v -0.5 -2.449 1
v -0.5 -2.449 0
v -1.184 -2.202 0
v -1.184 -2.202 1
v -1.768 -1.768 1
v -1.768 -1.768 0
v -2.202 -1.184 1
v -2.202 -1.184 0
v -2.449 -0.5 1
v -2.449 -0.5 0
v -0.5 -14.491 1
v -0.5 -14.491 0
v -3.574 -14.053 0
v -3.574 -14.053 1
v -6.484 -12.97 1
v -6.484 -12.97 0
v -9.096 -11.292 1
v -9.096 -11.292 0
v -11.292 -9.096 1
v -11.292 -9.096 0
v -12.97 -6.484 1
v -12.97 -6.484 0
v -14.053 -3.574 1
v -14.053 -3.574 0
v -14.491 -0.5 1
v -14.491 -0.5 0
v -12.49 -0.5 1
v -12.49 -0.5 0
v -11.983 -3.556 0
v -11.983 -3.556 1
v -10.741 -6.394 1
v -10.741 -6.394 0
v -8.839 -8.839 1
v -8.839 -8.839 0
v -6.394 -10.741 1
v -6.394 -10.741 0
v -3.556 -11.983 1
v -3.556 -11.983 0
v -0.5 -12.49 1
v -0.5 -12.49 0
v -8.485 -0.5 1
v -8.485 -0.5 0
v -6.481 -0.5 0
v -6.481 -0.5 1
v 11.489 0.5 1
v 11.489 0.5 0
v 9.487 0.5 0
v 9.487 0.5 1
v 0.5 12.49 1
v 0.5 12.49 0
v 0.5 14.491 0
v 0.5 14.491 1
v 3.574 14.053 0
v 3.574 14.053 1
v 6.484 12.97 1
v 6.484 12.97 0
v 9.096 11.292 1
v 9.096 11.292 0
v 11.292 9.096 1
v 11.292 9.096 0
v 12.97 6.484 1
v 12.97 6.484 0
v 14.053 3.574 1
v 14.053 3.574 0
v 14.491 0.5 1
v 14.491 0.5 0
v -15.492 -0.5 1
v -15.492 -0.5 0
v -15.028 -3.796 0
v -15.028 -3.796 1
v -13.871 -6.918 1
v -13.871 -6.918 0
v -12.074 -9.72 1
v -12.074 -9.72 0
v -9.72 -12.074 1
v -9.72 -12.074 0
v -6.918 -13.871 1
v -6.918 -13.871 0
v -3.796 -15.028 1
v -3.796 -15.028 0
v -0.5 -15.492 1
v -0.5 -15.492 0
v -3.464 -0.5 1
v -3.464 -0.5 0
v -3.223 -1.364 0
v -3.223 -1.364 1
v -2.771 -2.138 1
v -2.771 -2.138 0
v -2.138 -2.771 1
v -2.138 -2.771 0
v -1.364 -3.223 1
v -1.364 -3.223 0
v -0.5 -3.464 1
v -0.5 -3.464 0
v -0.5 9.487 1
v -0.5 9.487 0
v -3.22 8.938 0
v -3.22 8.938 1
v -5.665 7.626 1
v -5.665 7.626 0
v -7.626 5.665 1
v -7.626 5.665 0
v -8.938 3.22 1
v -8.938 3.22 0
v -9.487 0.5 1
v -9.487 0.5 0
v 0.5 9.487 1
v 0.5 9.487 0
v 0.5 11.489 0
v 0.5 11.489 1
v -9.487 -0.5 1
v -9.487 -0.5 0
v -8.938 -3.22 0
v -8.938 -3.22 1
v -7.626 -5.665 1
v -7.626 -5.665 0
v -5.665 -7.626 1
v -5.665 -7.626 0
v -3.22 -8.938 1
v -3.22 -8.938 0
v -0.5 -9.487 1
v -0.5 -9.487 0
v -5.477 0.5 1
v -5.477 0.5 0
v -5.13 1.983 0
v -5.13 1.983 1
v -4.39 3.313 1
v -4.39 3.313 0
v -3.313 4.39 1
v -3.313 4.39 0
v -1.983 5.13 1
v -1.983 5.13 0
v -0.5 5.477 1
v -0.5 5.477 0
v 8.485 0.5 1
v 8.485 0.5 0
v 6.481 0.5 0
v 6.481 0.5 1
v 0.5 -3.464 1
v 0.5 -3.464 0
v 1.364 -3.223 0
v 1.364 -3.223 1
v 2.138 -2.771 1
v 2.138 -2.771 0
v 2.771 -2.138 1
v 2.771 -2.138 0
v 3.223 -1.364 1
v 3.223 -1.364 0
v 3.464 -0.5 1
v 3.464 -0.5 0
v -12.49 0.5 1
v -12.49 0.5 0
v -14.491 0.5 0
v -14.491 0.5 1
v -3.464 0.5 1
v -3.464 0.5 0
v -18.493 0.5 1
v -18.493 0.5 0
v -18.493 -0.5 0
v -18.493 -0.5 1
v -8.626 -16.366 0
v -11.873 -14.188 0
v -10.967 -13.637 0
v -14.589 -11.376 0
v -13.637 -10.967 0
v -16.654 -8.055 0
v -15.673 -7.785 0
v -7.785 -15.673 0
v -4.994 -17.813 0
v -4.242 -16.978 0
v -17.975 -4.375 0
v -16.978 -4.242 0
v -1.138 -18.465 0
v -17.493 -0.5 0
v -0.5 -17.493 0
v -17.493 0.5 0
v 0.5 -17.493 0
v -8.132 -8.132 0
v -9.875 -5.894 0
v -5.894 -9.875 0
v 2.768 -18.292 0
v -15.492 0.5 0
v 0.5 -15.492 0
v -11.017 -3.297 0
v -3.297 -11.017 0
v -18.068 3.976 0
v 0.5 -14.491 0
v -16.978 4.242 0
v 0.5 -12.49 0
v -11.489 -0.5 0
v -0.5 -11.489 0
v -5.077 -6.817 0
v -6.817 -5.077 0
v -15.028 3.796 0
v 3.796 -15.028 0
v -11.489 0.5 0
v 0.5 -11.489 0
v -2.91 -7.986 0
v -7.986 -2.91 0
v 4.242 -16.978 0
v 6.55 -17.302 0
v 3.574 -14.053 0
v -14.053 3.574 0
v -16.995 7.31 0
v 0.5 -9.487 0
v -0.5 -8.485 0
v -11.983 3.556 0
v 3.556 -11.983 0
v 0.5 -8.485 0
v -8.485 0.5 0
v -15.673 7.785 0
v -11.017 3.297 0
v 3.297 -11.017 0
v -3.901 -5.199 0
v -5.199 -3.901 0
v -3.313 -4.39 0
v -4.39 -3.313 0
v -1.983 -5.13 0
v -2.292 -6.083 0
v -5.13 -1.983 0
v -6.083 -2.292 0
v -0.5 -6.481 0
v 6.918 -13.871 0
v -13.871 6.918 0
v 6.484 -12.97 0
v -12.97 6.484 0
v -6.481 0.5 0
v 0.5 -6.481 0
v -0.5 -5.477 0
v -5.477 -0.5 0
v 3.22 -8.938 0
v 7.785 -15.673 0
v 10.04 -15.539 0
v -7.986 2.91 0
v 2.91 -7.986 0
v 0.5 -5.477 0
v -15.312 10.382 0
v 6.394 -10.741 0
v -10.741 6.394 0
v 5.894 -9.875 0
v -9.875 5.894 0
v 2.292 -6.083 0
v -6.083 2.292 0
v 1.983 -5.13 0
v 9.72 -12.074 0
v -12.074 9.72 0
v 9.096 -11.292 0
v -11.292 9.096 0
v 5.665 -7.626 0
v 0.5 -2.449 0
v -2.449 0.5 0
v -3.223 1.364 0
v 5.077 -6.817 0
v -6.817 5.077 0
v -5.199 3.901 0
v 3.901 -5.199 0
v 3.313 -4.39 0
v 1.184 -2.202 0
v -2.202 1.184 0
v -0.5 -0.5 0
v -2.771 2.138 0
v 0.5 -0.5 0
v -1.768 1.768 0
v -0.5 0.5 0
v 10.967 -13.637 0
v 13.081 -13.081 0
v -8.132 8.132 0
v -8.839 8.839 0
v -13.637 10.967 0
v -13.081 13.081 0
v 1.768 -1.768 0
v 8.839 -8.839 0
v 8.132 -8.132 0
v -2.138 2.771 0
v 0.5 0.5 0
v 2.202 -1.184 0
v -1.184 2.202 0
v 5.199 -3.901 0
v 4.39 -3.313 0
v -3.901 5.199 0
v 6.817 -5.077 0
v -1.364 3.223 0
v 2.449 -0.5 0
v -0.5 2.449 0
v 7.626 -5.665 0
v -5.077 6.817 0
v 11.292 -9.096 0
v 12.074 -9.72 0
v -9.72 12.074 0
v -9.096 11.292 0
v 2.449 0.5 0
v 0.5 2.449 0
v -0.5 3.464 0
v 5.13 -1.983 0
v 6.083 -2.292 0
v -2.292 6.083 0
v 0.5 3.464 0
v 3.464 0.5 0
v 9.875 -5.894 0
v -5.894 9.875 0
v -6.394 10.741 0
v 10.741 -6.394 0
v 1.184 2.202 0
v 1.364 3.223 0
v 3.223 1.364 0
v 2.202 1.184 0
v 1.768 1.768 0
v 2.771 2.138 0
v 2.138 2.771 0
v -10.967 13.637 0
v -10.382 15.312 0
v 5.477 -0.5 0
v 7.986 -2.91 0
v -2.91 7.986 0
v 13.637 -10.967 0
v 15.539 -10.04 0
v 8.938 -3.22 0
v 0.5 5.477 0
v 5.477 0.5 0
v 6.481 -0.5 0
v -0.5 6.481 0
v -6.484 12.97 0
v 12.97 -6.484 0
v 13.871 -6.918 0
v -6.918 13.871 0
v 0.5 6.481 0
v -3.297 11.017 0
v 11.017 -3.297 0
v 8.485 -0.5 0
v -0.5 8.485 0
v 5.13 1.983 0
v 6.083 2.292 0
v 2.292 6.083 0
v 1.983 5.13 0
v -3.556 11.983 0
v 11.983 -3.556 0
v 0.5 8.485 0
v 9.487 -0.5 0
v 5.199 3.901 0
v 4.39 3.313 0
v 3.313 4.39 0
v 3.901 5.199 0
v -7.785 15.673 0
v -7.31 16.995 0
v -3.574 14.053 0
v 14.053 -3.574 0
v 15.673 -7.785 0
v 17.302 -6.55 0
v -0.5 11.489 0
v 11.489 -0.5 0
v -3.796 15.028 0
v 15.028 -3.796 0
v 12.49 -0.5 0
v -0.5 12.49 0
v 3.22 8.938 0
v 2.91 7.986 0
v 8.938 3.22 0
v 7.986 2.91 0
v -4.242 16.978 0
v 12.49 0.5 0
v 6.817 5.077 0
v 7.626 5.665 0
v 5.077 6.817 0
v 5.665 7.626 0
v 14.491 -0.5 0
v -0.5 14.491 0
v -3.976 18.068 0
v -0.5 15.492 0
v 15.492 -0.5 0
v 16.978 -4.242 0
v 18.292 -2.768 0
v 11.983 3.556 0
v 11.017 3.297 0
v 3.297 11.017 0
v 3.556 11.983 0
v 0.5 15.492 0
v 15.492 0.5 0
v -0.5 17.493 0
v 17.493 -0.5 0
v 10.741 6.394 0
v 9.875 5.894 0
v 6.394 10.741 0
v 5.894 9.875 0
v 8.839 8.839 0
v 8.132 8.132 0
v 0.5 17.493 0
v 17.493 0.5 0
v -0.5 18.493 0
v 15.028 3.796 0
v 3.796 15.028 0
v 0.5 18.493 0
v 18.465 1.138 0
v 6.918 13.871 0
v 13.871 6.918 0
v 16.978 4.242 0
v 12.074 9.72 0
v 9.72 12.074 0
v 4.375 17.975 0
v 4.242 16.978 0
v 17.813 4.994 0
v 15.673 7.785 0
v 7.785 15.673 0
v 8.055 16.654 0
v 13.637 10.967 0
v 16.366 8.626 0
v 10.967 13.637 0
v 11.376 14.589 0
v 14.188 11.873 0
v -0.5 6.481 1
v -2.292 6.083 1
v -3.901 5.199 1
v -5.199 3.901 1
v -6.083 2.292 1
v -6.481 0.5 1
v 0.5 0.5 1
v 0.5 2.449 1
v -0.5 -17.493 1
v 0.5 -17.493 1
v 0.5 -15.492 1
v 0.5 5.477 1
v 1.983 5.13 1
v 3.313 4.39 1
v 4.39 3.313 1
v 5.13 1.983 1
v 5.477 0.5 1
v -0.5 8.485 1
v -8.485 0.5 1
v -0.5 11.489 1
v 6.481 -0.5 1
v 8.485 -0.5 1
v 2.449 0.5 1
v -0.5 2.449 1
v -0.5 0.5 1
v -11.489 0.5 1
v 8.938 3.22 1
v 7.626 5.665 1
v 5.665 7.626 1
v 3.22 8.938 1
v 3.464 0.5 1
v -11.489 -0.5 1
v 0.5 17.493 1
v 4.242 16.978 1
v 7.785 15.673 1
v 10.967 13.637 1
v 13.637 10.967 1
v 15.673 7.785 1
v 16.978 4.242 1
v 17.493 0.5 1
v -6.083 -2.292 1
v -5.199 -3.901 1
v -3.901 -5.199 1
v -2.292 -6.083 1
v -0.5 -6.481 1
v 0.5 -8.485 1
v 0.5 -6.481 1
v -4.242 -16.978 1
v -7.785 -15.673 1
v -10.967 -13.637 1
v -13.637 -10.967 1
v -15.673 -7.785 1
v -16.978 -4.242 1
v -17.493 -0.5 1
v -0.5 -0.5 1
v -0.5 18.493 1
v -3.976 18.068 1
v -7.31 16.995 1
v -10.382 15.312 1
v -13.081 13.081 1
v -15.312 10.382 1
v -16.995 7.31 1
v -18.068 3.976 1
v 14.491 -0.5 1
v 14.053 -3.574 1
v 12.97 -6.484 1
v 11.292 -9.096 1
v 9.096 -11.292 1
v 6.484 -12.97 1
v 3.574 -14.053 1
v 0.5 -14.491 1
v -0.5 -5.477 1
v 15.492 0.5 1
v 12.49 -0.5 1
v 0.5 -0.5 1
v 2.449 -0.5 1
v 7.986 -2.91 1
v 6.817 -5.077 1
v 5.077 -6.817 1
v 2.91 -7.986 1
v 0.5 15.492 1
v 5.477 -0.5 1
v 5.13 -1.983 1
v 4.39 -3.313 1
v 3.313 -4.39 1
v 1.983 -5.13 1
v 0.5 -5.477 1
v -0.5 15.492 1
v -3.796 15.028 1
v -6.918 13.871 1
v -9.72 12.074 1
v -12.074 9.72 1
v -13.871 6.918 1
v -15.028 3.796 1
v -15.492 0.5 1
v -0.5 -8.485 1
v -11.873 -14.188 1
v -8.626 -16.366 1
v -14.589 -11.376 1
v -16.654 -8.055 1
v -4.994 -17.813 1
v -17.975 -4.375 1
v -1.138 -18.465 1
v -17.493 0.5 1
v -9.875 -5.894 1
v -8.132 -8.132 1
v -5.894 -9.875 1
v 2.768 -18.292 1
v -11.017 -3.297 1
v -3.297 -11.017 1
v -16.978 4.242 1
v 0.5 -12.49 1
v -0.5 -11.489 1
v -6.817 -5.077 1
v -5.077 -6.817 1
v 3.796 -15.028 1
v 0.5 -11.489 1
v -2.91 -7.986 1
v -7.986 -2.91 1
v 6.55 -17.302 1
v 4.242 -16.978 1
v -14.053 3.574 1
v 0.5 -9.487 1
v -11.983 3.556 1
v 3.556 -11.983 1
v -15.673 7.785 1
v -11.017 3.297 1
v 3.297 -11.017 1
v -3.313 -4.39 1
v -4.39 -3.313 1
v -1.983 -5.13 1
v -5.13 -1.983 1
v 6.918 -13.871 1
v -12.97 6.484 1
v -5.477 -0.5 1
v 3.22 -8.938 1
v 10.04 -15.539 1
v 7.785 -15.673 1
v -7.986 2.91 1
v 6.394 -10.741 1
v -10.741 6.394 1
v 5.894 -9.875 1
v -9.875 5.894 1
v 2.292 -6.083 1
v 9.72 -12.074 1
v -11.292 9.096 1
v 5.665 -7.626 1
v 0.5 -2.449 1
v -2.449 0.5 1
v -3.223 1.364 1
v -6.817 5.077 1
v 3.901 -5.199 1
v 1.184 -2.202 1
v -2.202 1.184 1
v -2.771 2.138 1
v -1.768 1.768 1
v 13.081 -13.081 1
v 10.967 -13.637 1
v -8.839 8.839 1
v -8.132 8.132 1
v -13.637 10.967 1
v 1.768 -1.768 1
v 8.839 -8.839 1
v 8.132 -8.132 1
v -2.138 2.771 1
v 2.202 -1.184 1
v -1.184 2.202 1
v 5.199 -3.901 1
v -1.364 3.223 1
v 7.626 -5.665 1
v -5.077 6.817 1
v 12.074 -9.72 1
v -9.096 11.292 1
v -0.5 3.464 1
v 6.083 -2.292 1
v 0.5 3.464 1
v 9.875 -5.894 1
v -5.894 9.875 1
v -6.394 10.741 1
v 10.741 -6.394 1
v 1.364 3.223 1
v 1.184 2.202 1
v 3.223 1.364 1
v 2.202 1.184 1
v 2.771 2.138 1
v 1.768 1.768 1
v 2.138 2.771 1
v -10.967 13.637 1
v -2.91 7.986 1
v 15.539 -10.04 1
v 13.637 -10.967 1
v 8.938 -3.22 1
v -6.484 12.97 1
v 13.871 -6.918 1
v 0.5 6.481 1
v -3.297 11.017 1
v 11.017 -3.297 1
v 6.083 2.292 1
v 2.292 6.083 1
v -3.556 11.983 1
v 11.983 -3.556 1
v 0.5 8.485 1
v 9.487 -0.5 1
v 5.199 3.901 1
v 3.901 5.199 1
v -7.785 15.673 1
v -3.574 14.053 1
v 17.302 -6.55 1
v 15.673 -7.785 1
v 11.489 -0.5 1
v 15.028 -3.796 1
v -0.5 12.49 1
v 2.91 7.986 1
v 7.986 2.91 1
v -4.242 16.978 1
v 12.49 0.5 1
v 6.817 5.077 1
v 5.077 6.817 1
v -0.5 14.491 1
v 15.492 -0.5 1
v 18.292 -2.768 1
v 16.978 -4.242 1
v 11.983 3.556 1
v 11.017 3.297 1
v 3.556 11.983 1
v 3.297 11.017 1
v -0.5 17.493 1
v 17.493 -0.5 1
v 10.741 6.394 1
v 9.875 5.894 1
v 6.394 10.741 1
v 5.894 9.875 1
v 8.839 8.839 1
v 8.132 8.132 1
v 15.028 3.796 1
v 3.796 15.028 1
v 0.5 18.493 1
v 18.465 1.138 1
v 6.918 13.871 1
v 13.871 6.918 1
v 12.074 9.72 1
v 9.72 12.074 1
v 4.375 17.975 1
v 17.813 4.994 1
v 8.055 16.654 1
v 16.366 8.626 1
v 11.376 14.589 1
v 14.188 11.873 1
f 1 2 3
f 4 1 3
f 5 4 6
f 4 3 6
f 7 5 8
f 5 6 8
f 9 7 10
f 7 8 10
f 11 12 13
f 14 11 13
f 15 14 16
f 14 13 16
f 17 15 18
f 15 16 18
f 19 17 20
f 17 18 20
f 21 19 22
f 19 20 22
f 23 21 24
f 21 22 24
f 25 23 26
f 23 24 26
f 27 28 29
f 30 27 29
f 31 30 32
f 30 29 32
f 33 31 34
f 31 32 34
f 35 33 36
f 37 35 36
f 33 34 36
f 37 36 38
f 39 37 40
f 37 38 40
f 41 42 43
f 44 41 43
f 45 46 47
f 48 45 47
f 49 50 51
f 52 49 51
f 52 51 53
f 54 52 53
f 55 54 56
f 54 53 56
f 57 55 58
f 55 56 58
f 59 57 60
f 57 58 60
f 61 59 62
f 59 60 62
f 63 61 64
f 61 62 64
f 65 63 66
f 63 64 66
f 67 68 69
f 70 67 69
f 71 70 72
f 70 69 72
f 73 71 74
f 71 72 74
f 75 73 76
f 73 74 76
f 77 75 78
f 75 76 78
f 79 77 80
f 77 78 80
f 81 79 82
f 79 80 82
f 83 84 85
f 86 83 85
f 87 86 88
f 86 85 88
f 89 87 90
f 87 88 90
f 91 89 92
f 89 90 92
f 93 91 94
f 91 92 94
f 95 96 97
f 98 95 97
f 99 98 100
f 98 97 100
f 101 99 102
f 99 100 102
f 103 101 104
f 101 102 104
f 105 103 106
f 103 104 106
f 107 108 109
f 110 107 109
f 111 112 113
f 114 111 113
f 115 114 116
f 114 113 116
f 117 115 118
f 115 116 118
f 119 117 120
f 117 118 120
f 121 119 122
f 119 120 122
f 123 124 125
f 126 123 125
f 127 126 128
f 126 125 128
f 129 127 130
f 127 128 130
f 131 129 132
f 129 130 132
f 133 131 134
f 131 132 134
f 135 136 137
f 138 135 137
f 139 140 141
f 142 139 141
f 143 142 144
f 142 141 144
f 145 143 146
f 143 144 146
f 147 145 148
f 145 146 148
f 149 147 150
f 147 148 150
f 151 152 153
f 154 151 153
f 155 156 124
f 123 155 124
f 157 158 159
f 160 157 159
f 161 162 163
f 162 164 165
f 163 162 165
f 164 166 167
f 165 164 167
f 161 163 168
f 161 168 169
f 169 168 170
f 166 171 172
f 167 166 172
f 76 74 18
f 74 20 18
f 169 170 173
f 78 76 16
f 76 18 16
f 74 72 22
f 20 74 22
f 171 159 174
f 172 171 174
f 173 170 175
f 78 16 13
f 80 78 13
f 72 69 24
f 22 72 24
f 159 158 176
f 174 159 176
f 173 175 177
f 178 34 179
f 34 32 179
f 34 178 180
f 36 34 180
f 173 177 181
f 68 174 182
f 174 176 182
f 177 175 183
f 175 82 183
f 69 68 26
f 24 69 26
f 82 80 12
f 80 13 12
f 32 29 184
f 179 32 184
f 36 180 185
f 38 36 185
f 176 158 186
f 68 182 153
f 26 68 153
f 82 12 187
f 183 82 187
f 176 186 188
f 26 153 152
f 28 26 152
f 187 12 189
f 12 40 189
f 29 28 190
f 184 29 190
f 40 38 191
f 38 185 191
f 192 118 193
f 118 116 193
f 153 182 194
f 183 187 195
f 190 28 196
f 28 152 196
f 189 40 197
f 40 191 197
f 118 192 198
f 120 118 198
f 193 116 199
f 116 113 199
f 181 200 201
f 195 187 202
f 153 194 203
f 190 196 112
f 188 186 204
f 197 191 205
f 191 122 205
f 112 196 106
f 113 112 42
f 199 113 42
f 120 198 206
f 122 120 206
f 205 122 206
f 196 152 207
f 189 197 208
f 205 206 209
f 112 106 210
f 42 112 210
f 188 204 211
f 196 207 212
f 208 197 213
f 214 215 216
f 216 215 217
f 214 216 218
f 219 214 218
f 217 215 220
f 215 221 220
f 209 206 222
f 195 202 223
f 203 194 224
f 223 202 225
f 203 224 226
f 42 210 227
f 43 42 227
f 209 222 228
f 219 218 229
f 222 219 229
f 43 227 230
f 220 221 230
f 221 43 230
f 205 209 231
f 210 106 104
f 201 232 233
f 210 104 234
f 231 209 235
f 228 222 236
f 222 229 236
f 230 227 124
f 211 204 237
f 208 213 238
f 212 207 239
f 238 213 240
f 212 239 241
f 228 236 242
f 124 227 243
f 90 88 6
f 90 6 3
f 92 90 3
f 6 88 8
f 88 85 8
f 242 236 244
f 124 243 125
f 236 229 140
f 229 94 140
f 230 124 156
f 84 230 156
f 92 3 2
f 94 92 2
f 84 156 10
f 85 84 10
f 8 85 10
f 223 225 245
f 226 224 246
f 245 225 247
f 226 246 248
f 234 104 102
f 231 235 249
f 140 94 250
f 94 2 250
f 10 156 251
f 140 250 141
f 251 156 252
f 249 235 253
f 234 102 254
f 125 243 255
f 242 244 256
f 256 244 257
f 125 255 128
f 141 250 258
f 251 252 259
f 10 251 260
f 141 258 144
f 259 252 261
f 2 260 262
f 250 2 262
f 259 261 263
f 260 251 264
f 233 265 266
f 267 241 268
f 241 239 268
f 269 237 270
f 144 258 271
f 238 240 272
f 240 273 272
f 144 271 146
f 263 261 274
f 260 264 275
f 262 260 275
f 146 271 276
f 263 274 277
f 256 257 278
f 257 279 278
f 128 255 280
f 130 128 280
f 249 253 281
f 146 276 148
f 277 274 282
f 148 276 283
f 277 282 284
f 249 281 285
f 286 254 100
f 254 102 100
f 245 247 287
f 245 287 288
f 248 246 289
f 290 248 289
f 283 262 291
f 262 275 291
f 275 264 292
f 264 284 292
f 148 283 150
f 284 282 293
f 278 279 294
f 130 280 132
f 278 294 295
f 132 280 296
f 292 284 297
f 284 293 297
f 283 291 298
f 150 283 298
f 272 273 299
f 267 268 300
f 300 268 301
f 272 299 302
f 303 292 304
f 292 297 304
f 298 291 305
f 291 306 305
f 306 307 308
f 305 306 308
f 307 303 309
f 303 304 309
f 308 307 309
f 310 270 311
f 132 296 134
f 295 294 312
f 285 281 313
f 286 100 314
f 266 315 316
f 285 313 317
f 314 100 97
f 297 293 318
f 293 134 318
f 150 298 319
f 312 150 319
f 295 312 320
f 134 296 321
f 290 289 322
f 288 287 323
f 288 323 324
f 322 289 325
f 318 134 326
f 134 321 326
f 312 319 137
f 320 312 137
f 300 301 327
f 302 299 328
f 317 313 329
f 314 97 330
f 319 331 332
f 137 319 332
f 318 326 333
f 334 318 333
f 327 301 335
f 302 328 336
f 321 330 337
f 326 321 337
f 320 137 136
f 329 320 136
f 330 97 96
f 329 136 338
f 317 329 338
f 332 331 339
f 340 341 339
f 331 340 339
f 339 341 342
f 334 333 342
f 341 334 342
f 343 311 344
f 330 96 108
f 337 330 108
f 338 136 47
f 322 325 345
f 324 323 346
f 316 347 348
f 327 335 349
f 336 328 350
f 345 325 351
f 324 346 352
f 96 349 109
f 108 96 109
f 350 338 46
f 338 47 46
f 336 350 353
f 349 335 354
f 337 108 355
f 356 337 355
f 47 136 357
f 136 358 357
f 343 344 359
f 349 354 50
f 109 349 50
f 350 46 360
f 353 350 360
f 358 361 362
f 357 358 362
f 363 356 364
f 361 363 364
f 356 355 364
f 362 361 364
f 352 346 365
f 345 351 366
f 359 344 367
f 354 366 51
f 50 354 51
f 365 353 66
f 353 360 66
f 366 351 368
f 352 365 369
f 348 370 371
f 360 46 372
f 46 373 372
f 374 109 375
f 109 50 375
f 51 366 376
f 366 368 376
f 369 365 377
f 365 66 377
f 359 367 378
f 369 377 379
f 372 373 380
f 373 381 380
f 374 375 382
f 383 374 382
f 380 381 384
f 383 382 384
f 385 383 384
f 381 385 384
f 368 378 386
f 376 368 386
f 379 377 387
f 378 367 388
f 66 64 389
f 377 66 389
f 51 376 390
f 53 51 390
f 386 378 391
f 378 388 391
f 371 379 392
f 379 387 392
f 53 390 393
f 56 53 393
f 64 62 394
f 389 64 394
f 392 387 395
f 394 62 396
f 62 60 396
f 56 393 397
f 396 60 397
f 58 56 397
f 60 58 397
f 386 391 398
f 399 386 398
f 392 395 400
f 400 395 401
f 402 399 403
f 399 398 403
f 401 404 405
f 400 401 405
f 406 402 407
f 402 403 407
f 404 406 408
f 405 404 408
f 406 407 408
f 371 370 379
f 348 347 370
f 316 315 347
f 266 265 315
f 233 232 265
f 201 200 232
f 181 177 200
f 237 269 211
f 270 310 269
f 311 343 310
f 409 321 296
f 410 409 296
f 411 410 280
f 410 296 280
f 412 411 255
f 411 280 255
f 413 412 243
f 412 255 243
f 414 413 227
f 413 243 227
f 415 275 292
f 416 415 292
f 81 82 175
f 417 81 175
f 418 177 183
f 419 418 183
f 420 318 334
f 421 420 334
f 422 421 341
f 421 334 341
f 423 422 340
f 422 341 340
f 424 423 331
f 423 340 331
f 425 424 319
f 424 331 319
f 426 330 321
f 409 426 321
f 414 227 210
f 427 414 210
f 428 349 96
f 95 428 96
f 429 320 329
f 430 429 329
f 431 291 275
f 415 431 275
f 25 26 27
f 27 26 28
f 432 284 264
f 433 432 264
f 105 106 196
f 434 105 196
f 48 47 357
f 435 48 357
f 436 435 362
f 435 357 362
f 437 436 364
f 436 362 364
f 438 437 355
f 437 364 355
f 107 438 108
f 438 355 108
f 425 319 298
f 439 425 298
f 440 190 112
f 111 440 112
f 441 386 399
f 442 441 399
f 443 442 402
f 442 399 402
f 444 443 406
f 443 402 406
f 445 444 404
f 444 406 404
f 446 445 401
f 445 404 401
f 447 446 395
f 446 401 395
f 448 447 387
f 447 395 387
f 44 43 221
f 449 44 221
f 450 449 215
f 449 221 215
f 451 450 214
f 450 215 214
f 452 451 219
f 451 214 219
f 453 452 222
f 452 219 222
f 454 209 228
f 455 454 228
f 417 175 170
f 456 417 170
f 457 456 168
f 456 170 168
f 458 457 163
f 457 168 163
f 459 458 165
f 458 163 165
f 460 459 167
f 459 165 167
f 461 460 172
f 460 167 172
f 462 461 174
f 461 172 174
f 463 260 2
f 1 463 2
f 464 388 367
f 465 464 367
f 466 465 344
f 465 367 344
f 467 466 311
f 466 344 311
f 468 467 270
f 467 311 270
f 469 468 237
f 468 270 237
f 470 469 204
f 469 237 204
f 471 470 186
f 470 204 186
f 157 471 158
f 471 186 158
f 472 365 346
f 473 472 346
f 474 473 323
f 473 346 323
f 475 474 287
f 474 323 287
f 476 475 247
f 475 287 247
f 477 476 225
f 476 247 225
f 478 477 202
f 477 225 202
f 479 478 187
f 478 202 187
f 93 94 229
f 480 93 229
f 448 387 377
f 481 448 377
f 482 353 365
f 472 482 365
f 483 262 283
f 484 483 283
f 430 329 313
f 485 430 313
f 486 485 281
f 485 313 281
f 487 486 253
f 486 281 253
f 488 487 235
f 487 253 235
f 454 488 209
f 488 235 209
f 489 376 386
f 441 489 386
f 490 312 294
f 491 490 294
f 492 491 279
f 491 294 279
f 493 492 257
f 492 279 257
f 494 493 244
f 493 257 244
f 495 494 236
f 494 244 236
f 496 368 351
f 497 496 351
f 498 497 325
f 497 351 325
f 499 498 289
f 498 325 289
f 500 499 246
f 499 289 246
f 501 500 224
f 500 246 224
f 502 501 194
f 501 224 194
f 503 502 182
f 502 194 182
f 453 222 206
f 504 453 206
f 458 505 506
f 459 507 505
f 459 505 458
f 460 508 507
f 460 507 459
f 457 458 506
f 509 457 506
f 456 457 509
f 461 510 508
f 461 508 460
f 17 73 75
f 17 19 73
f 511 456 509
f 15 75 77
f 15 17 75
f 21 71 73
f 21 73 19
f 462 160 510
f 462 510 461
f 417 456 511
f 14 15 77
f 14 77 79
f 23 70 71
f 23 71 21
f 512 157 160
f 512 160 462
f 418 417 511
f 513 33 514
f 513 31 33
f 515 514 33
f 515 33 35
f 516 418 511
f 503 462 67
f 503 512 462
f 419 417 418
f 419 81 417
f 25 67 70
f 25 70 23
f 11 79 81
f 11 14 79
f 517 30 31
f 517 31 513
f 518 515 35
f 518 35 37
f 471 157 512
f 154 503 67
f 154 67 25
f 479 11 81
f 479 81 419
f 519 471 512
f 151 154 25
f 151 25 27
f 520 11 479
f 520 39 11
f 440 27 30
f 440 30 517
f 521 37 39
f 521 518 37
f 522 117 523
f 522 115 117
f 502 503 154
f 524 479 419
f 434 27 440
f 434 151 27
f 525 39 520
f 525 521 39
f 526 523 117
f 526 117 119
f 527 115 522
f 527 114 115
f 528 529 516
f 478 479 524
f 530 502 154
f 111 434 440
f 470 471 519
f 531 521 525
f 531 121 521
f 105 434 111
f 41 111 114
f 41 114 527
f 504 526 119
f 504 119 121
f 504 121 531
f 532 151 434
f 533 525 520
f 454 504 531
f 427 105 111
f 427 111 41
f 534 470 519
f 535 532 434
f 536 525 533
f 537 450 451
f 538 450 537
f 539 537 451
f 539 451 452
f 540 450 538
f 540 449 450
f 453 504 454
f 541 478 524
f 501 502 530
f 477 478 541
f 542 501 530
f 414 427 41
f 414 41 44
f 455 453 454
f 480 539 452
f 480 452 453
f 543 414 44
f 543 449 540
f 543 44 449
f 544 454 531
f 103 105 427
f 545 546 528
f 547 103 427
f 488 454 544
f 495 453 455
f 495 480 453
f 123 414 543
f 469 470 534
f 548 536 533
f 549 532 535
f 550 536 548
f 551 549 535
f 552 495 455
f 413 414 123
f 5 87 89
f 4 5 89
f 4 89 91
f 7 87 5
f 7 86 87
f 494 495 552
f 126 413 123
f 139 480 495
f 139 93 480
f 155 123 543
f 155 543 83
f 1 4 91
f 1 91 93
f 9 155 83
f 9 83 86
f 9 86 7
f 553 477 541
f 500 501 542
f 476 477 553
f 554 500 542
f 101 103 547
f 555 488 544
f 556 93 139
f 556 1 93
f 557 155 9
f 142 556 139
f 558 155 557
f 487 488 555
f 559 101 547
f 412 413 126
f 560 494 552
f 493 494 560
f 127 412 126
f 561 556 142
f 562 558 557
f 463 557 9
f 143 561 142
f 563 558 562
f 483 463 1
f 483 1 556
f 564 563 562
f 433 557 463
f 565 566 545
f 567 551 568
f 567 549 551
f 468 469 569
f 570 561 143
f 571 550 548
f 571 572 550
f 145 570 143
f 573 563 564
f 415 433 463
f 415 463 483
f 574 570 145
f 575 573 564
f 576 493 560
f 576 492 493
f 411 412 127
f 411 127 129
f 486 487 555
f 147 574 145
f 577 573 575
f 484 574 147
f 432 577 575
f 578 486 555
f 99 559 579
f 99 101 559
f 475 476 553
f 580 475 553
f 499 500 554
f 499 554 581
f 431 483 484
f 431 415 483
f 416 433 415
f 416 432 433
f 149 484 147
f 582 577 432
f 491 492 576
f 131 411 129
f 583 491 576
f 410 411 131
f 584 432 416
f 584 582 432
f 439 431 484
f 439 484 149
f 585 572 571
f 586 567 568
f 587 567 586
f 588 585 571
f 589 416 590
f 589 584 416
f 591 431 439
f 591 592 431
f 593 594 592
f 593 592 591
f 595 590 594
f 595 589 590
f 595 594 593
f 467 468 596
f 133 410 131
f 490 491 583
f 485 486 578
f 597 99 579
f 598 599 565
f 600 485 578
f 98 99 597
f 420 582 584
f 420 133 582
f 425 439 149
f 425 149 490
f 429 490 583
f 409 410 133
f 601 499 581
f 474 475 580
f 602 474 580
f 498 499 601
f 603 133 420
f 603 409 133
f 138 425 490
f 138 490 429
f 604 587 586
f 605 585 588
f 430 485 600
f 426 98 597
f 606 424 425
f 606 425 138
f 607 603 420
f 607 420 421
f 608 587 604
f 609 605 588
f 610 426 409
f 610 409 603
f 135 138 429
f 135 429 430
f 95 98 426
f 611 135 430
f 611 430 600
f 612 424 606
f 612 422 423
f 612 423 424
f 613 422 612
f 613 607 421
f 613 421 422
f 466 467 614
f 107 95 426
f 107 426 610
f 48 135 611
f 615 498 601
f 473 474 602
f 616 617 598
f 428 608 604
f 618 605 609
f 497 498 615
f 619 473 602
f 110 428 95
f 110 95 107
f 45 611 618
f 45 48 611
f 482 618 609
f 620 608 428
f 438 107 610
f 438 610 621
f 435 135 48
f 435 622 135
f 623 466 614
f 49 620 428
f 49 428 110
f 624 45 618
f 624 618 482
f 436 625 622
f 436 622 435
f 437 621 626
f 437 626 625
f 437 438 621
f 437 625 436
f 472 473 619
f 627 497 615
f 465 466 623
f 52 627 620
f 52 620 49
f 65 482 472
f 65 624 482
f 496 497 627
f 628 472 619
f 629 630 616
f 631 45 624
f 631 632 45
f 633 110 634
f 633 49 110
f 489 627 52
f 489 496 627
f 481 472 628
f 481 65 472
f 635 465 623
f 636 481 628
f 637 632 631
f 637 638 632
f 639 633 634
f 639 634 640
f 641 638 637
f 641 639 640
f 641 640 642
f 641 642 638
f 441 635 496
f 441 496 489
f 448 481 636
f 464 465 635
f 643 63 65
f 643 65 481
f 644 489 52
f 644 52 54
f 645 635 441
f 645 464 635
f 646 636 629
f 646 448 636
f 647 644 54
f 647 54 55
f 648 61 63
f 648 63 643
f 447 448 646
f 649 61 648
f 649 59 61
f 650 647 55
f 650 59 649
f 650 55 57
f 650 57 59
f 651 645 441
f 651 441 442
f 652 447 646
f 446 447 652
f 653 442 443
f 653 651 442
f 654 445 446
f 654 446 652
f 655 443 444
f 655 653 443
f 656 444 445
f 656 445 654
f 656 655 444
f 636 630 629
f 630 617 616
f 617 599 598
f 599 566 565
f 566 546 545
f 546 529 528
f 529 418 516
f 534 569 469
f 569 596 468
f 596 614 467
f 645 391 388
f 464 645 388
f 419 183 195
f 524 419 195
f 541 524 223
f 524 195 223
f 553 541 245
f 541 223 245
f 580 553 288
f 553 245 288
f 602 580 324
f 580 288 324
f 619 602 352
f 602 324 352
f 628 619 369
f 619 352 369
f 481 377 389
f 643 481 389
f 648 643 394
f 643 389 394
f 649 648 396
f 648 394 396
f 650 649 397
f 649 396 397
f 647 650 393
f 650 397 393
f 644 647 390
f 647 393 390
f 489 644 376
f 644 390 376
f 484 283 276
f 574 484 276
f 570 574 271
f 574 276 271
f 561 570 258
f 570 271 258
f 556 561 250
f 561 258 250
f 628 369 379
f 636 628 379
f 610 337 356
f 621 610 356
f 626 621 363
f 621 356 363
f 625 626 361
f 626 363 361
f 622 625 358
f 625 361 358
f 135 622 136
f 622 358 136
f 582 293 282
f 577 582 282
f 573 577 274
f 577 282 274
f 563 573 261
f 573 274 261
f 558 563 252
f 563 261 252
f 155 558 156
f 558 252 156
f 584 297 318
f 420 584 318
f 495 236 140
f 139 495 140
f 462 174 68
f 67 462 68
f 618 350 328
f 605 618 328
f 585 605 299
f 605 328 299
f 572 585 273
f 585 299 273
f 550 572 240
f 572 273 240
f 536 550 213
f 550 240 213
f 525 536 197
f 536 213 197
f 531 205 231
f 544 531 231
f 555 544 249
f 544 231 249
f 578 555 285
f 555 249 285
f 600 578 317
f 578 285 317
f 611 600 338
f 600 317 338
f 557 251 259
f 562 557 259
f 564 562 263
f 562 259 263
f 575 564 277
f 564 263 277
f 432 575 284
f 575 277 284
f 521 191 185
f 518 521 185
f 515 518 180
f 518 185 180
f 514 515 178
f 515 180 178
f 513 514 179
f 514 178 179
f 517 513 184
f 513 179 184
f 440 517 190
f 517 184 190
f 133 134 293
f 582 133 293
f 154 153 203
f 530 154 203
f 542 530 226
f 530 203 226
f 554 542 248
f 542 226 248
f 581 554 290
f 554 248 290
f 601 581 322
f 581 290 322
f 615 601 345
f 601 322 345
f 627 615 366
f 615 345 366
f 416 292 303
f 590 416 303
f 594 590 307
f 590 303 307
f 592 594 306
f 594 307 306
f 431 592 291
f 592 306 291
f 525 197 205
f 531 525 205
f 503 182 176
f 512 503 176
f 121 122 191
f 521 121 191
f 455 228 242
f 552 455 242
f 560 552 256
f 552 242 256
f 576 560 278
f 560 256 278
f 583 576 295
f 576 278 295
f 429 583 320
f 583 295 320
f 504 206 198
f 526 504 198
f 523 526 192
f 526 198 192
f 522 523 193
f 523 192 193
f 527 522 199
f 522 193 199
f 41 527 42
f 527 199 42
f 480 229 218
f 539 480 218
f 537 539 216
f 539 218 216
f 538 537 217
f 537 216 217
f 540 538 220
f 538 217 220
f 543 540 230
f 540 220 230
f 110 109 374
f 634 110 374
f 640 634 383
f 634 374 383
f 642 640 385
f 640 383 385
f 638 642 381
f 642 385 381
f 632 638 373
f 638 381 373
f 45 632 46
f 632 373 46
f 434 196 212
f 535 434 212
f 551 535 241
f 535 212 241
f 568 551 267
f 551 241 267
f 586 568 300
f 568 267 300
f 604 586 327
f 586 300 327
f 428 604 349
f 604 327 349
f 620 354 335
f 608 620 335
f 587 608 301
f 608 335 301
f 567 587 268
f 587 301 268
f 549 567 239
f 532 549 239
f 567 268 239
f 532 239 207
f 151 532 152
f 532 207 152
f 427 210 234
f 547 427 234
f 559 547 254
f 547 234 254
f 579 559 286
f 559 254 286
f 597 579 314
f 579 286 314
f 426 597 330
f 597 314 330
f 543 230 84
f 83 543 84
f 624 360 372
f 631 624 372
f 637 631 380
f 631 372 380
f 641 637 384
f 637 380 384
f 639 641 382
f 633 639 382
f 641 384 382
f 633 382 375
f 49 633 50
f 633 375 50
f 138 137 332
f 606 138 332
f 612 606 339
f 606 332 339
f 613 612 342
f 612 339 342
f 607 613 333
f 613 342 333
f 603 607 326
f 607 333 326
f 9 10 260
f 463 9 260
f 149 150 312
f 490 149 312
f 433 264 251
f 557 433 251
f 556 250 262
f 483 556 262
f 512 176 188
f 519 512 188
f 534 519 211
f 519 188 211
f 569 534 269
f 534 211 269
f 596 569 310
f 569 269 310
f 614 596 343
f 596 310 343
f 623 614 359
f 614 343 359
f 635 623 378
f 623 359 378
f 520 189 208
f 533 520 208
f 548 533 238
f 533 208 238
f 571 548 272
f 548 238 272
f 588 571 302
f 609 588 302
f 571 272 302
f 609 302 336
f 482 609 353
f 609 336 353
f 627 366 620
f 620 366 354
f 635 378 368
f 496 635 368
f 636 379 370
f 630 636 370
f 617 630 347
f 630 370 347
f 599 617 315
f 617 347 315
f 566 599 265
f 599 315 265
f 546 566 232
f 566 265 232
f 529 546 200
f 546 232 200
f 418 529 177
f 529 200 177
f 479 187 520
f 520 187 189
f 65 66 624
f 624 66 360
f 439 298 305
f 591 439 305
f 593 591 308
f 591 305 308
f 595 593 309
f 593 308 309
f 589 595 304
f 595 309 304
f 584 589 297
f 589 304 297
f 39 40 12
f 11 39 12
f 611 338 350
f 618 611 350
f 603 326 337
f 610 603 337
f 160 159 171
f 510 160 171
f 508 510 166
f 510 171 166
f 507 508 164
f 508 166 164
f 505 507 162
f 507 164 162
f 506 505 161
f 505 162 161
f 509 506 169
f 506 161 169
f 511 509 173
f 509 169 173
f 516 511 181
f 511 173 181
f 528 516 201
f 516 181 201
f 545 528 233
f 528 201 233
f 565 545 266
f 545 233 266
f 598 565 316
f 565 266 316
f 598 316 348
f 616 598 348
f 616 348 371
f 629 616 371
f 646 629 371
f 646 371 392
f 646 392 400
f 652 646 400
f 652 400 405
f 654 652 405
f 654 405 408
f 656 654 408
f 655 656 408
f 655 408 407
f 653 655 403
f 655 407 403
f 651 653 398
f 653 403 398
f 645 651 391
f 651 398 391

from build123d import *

# Parameters (mm, degrees)
F1_DEPTH = 1


with BuildPart() as f1:
    # F0 (on Top) → F1 (new body)
    with BuildSketch(Plane.XY):
        with BuildLine():
            Line((-18.493242, 0.5), (-18.493242, -0.5))
            ThreePointArc((-18.493242, -0.5), (13.081475, -13.081475), (0.5, 18.493242))
            Line((0.5, 18.493242), (-0.5, 18.493242))
            ThreePointArc((-0.5, 18.493242), (-13.081475, 13.081475), (-18.493242, 0.5))
        make_face()
        with BuildLine():
            Line((-17.492856, -0.5), (-15.491933, -0.5))
            ThreePointArc((-15.491933, -0.5), (-10.960155, -10.960155), (-0.5, -15.491933))
            Line((-0.5, -15.491933), (-0.5, -17.492856))
            ThreePointArc((-0.5, -17.492856), (-12.374369, -12.374369), (-17.492856, -0.5))
        make_face(mode=Mode.SUBTRACT)
        with BuildLine():
            Line((-14.491377, -0.5), (-12.489996, -0.5))
            ThreePointArc((-12.489996, -0.5), (-8.838835, -8.838835), (-0.5, -12.489996))
            Line((-0.5, -12.489996), (-0.5, -14.491377))
            ThreePointArc((-0.5, -14.491377), (-10.253048, -10.253048), (-14.491377, -0.5))
        make_face(mode=Mode.SUBTRACT)
        with BuildLine():
            Line((-11.489125, -0.5), (-9.486833, -0.5))
            ThreePointArc((-9.486833, -0.5), (-6.717514, -6.717514), (-0.5, -9.486833))
            Line((-0.5, -9.486833), (-0.5, -11.489125))
            ThreePointArc((-0.5, -11.489125), (-8.131728, -8.131728), (-11.489125, -0.5))
        make_face(mode=Mode.SUBTRACT)
        with BuildLine():
            Line((-8.485281, -0.5), (-6.480741, -0.5))
            ThreePointArc((-6.480741, -0.5), (-4.596194, -4.596194), (-0.5, -6.480741))
            Line((-0.5, -6.480741), (-0.5, -8.485281))
            ThreePointArc((-0.5, -8.485281), (-6.010408, -6.010408), (-8.485281, -0.5))
        make_face(mode=Mode.SUBTRACT)
        with BuildLine():
            Line((-5.477226, -0.5), (-3.464102, -0.5))
            ThreePointArc((-3.464102, -0.5), (-2.474874, -2.474874), (-0.5, -3.464102))
            Line((-0.5, -3.464102), (-0.5, -5.477226))
            ThreePointArc((-0.5, -5.477226), (-3.889087, -3.889087), (-5.477226, -0.5))
        make_face(mode=Mode.SUBTRACT)
        with BuildLine():
            ThreePointArc((-0.5, -2.44949), (-1.767767, -1.767767), (-2.44949, -0.5))
            Line((-2.44949, -0.5), (-0.5, -0.5))
            Line((-0.5, -0.5), (-0.5, -2.44949))
        make_face(mode=Mode.SUBTRACT)
        with BuildLine():
            Line((15.491933, -0.5), (17.492856, -0.5))
            ThreePointArc((17.492856, -0.5), (12.374369, -12.374369), (0.5, -17.492856))
            Line((0.5, -17.492856), (0.5, -15.491933))
            ThreePointArc((0.5, -15.491933), (10.960155, -10.960155), (15.491933, -0.5))
        make_face(mode=Mode.SUBTRACT)
        with BuildLine():
            Line((12.489996, -0.5), (14.491377, -0.5))
            ThreePointArc((14.491377, -0.5), (10.253048, -10.253048), (0.5, -14.491377))
            Line((0.5, -14.491377), (0.5, -12.489996))
            ThreePointArc((0.5, -12.489996), (8.838835, -8.838835), (12.489996, -0.5))
        make_face(mode=Mode.SUBTRACT)
        with BuildLine():
            Line((9.486833, -0.5), (11.489125, -0.5))
            ThreePointArc((11.489125, -0.5), (8.131728, -8.131728), (0.5, -11.489125))
            Line((0.5, -11.489125), (0.5, -9.486833))
            ThreePointArc((0.5, -9.486833), (6.717514, -6.717514), (9.486833, -0.5))
        make_face(mode=Mode.SUBTRACT)
        with BuildLine():
            Line((6.480741, -0.5), (8.485281, -0.5))
            ThreePointArc((8.485281, -0.5), (6.010408, -6.010408), (0.5, -8.485281))
            Line((0.5, -8.485281), (0.5, -6.480741))
            ThreePointArc((0.5, -6.480741), (4.596194, -4.596194), (6.480741, -0.5))
        make_face(mode=Mode.SUBTRACT)
        with BuildLine():
            Line((3.464102, -0.5), (5.477226, -0.5))
            ThreePointArc((5.477226, -0.5), (3.889087, -3.889087), (0.5, -5.477226))
            Line((0.5, -5.477226), (0.5, -3.464102))
            ThreePointArc((0.5, -3.464102), (2.474874, -2.474874), (3.464102, -0.5))
        make_face(mode=Mode.SUBTRACT)
        with BuildLine():
            Line((0.5, -2.44949), (0.5, -0.5))
            Line((0.5, -0.5), (2.44949, -0.5))
            ThreePointArc((2.44949, -0.5), (1.767767, -1.767767), (0.5, -2.44949))
        make_face(mode=Mode.SUBTRACT)
        with BuildLine():
            Line((-0.5, 2.44949), (-0.5, 0.5))
            Line((-0.5, 0.5), (-2.44949, 0.5))
            ThreePointArc((-2.44949, 0.5), (-1.767767, 1.767767), (-0.5, 2.44949))
        make_face(mode=Mode.SUBTRACT)
        with BuildLine():
            Line((-3.464102, 0.5), (-5.477226, 0.5))
            ThreePointArc((-5.477226, 0.5), (-3.889087, 3.889087), (-0.5, 5.477226))
            Line((-0.5, 5.477226), (-0.5, 3.464102))
            ThreePointArc((-0.5, 3.464102), (-2.474874, 2.474874), (-3.464102, 0.5))
        make_face(mode=Mode.SUBTRACT)
        with BuildLine():
            Line((-6.480741, 0.5), (-8.485281, 0.5))
            ThreePointArc((-8.485281, 0.5), (-6.010408, 6.010408), (-0.5, 8.485281))
            Line((-0.5, 8.485281), (-0.5, 6.480741))
            ThreePointArc((-0.5, 6.480741), (-4.596194, 4.596194), (-6.480741, 0.5))
        make_face(mode=Mode.SUBTRACT)
        with BuildLine():
            Line((-9.486833, 0.5), (-11.489125, 0.5))
            ThreePointArc((-11.489125, 0.5), (-8.131728, 8.131728), (-0.5, 11.489125))
            Line((-0.5, 11.489125), (-0.5, 9.486833))
            ThreePointArc((-0.5, 9.486833), (-6.717514, 6.717514), (-9.486833, 0.5))
        make_face(mode=Mode.SUBTRACT)
        with BuildLine():
            Line((-12.489996, 0.5), (-14.491377, 0.5))
            ThreePointArc((-14.491377, 0.5), (-10.253048, 10.253048), (-0.5, 14.491377))
            Line((-0.5, 14.491377), (-0.5, 12.489996))
            ThreePointArc((-0.5, 12.489996), (-8.838835, 8.838835), (-12.489996, 0.5))
        make_face(mode=Mode.SUBTRACT)
        with BuildLine():
            Line((-15.491933, 0.5), (-17.492856, 0.5))
            ThreePointArc((-17.492856, 0.5), (-12.374369, 12.374369), (-0.5, 17.492856))
            Line((-0.5, 17.492856), (-0.5, 15.491933))
            ThreePointArc((-0.5, 15.491933), (-10.960155, 10.960155), (-15.491933, 0.5))
        make_face(mode=Mode.SUBTRACT)
        with BuildLine():
            Line((2.44949, 0.5), (0.5, 0.5))
            Line((0.5, 0.5), (0.5, 2.44949))
            ThreePointArc((0.5, 2.44949), (1.767767, 1.767767), (2.44949, 0.5))
        make_face(mode=Mode.SUBTRACT)
        with BuildLine():
            Line((5.477226, 0.5), (3.464102, 0.5))
            ThreePointArc((3.464102, 0.5), (2.474874, 2.474874), (0.5, 3.464102))
            Line((0.5, 3.464102), (0.5, 5.477226))
            ThreePointArc((0.5, 5.477226), (3.889087, 3.889087), (5.477226, 0.5))
        make_face(mode=Mode.SUBTRACT)
        with BuildLine():
            Line((8.485281, 0.5), (6.480741, 0.5))
            ThreePointArc((6.480741, 0.5), (4.596194, 4.596194), (0.5, 6.480741))
            Line((0.5, 6.480741), (0.5, 8.485281))
            ThreePointArc((0.5, 8.485281), (6.010408, 6.010408), (8.485281, 0.5))
        make_face(mode=Mode.SUBTRACT)
        with BuildLine():
            Line((11.489125, 0.5), (9.486833, 0.5))
            ThreePointArc((9.486833, 0.5), (6.717514, 6.717514), (0.5, 9.486833))
            Line((0.5, 9.486833), (0.5, 11.489125))
            ThreePointArc((0.5, 11.489125), (8.131728, 8.131728), (11.489125, 0.5))
        make_face(mode=Mode.SUBTRACT)
        with BuildLine():
            Line((14.491377, 0.5), (12.489996, 0.5))
            ThreePointArc((12.489996, 0.5), (8.838835, 8.838835), (0.5, 12.489996))
            Line((0.5, 12.489996), (0.5, 14.491377))
            ThreePointArc((0.5, 14.491377), (10.253048, 10.253048), (14.491377, 0.5))
        make_face(mode=Mode.SUBTRACT)
        with BuildLine():
            Line((0.5, 15.491933), (0.5, 17.492856))
            ThreePointArc((0.5, 17.492856), (12.374369, 12.374369), (17.492856, 0.5))
            Line((17.492856, 0.5), (15.491933, 0.5))
            ThreePointArc((15.491933, 0.5), (10.960155, 10.960155), (0.5, 15.491933))
        make_face(mode=Mode.SUBTRACT)
    extrude(amount=F1_DEPTH)


solid = f1.part
